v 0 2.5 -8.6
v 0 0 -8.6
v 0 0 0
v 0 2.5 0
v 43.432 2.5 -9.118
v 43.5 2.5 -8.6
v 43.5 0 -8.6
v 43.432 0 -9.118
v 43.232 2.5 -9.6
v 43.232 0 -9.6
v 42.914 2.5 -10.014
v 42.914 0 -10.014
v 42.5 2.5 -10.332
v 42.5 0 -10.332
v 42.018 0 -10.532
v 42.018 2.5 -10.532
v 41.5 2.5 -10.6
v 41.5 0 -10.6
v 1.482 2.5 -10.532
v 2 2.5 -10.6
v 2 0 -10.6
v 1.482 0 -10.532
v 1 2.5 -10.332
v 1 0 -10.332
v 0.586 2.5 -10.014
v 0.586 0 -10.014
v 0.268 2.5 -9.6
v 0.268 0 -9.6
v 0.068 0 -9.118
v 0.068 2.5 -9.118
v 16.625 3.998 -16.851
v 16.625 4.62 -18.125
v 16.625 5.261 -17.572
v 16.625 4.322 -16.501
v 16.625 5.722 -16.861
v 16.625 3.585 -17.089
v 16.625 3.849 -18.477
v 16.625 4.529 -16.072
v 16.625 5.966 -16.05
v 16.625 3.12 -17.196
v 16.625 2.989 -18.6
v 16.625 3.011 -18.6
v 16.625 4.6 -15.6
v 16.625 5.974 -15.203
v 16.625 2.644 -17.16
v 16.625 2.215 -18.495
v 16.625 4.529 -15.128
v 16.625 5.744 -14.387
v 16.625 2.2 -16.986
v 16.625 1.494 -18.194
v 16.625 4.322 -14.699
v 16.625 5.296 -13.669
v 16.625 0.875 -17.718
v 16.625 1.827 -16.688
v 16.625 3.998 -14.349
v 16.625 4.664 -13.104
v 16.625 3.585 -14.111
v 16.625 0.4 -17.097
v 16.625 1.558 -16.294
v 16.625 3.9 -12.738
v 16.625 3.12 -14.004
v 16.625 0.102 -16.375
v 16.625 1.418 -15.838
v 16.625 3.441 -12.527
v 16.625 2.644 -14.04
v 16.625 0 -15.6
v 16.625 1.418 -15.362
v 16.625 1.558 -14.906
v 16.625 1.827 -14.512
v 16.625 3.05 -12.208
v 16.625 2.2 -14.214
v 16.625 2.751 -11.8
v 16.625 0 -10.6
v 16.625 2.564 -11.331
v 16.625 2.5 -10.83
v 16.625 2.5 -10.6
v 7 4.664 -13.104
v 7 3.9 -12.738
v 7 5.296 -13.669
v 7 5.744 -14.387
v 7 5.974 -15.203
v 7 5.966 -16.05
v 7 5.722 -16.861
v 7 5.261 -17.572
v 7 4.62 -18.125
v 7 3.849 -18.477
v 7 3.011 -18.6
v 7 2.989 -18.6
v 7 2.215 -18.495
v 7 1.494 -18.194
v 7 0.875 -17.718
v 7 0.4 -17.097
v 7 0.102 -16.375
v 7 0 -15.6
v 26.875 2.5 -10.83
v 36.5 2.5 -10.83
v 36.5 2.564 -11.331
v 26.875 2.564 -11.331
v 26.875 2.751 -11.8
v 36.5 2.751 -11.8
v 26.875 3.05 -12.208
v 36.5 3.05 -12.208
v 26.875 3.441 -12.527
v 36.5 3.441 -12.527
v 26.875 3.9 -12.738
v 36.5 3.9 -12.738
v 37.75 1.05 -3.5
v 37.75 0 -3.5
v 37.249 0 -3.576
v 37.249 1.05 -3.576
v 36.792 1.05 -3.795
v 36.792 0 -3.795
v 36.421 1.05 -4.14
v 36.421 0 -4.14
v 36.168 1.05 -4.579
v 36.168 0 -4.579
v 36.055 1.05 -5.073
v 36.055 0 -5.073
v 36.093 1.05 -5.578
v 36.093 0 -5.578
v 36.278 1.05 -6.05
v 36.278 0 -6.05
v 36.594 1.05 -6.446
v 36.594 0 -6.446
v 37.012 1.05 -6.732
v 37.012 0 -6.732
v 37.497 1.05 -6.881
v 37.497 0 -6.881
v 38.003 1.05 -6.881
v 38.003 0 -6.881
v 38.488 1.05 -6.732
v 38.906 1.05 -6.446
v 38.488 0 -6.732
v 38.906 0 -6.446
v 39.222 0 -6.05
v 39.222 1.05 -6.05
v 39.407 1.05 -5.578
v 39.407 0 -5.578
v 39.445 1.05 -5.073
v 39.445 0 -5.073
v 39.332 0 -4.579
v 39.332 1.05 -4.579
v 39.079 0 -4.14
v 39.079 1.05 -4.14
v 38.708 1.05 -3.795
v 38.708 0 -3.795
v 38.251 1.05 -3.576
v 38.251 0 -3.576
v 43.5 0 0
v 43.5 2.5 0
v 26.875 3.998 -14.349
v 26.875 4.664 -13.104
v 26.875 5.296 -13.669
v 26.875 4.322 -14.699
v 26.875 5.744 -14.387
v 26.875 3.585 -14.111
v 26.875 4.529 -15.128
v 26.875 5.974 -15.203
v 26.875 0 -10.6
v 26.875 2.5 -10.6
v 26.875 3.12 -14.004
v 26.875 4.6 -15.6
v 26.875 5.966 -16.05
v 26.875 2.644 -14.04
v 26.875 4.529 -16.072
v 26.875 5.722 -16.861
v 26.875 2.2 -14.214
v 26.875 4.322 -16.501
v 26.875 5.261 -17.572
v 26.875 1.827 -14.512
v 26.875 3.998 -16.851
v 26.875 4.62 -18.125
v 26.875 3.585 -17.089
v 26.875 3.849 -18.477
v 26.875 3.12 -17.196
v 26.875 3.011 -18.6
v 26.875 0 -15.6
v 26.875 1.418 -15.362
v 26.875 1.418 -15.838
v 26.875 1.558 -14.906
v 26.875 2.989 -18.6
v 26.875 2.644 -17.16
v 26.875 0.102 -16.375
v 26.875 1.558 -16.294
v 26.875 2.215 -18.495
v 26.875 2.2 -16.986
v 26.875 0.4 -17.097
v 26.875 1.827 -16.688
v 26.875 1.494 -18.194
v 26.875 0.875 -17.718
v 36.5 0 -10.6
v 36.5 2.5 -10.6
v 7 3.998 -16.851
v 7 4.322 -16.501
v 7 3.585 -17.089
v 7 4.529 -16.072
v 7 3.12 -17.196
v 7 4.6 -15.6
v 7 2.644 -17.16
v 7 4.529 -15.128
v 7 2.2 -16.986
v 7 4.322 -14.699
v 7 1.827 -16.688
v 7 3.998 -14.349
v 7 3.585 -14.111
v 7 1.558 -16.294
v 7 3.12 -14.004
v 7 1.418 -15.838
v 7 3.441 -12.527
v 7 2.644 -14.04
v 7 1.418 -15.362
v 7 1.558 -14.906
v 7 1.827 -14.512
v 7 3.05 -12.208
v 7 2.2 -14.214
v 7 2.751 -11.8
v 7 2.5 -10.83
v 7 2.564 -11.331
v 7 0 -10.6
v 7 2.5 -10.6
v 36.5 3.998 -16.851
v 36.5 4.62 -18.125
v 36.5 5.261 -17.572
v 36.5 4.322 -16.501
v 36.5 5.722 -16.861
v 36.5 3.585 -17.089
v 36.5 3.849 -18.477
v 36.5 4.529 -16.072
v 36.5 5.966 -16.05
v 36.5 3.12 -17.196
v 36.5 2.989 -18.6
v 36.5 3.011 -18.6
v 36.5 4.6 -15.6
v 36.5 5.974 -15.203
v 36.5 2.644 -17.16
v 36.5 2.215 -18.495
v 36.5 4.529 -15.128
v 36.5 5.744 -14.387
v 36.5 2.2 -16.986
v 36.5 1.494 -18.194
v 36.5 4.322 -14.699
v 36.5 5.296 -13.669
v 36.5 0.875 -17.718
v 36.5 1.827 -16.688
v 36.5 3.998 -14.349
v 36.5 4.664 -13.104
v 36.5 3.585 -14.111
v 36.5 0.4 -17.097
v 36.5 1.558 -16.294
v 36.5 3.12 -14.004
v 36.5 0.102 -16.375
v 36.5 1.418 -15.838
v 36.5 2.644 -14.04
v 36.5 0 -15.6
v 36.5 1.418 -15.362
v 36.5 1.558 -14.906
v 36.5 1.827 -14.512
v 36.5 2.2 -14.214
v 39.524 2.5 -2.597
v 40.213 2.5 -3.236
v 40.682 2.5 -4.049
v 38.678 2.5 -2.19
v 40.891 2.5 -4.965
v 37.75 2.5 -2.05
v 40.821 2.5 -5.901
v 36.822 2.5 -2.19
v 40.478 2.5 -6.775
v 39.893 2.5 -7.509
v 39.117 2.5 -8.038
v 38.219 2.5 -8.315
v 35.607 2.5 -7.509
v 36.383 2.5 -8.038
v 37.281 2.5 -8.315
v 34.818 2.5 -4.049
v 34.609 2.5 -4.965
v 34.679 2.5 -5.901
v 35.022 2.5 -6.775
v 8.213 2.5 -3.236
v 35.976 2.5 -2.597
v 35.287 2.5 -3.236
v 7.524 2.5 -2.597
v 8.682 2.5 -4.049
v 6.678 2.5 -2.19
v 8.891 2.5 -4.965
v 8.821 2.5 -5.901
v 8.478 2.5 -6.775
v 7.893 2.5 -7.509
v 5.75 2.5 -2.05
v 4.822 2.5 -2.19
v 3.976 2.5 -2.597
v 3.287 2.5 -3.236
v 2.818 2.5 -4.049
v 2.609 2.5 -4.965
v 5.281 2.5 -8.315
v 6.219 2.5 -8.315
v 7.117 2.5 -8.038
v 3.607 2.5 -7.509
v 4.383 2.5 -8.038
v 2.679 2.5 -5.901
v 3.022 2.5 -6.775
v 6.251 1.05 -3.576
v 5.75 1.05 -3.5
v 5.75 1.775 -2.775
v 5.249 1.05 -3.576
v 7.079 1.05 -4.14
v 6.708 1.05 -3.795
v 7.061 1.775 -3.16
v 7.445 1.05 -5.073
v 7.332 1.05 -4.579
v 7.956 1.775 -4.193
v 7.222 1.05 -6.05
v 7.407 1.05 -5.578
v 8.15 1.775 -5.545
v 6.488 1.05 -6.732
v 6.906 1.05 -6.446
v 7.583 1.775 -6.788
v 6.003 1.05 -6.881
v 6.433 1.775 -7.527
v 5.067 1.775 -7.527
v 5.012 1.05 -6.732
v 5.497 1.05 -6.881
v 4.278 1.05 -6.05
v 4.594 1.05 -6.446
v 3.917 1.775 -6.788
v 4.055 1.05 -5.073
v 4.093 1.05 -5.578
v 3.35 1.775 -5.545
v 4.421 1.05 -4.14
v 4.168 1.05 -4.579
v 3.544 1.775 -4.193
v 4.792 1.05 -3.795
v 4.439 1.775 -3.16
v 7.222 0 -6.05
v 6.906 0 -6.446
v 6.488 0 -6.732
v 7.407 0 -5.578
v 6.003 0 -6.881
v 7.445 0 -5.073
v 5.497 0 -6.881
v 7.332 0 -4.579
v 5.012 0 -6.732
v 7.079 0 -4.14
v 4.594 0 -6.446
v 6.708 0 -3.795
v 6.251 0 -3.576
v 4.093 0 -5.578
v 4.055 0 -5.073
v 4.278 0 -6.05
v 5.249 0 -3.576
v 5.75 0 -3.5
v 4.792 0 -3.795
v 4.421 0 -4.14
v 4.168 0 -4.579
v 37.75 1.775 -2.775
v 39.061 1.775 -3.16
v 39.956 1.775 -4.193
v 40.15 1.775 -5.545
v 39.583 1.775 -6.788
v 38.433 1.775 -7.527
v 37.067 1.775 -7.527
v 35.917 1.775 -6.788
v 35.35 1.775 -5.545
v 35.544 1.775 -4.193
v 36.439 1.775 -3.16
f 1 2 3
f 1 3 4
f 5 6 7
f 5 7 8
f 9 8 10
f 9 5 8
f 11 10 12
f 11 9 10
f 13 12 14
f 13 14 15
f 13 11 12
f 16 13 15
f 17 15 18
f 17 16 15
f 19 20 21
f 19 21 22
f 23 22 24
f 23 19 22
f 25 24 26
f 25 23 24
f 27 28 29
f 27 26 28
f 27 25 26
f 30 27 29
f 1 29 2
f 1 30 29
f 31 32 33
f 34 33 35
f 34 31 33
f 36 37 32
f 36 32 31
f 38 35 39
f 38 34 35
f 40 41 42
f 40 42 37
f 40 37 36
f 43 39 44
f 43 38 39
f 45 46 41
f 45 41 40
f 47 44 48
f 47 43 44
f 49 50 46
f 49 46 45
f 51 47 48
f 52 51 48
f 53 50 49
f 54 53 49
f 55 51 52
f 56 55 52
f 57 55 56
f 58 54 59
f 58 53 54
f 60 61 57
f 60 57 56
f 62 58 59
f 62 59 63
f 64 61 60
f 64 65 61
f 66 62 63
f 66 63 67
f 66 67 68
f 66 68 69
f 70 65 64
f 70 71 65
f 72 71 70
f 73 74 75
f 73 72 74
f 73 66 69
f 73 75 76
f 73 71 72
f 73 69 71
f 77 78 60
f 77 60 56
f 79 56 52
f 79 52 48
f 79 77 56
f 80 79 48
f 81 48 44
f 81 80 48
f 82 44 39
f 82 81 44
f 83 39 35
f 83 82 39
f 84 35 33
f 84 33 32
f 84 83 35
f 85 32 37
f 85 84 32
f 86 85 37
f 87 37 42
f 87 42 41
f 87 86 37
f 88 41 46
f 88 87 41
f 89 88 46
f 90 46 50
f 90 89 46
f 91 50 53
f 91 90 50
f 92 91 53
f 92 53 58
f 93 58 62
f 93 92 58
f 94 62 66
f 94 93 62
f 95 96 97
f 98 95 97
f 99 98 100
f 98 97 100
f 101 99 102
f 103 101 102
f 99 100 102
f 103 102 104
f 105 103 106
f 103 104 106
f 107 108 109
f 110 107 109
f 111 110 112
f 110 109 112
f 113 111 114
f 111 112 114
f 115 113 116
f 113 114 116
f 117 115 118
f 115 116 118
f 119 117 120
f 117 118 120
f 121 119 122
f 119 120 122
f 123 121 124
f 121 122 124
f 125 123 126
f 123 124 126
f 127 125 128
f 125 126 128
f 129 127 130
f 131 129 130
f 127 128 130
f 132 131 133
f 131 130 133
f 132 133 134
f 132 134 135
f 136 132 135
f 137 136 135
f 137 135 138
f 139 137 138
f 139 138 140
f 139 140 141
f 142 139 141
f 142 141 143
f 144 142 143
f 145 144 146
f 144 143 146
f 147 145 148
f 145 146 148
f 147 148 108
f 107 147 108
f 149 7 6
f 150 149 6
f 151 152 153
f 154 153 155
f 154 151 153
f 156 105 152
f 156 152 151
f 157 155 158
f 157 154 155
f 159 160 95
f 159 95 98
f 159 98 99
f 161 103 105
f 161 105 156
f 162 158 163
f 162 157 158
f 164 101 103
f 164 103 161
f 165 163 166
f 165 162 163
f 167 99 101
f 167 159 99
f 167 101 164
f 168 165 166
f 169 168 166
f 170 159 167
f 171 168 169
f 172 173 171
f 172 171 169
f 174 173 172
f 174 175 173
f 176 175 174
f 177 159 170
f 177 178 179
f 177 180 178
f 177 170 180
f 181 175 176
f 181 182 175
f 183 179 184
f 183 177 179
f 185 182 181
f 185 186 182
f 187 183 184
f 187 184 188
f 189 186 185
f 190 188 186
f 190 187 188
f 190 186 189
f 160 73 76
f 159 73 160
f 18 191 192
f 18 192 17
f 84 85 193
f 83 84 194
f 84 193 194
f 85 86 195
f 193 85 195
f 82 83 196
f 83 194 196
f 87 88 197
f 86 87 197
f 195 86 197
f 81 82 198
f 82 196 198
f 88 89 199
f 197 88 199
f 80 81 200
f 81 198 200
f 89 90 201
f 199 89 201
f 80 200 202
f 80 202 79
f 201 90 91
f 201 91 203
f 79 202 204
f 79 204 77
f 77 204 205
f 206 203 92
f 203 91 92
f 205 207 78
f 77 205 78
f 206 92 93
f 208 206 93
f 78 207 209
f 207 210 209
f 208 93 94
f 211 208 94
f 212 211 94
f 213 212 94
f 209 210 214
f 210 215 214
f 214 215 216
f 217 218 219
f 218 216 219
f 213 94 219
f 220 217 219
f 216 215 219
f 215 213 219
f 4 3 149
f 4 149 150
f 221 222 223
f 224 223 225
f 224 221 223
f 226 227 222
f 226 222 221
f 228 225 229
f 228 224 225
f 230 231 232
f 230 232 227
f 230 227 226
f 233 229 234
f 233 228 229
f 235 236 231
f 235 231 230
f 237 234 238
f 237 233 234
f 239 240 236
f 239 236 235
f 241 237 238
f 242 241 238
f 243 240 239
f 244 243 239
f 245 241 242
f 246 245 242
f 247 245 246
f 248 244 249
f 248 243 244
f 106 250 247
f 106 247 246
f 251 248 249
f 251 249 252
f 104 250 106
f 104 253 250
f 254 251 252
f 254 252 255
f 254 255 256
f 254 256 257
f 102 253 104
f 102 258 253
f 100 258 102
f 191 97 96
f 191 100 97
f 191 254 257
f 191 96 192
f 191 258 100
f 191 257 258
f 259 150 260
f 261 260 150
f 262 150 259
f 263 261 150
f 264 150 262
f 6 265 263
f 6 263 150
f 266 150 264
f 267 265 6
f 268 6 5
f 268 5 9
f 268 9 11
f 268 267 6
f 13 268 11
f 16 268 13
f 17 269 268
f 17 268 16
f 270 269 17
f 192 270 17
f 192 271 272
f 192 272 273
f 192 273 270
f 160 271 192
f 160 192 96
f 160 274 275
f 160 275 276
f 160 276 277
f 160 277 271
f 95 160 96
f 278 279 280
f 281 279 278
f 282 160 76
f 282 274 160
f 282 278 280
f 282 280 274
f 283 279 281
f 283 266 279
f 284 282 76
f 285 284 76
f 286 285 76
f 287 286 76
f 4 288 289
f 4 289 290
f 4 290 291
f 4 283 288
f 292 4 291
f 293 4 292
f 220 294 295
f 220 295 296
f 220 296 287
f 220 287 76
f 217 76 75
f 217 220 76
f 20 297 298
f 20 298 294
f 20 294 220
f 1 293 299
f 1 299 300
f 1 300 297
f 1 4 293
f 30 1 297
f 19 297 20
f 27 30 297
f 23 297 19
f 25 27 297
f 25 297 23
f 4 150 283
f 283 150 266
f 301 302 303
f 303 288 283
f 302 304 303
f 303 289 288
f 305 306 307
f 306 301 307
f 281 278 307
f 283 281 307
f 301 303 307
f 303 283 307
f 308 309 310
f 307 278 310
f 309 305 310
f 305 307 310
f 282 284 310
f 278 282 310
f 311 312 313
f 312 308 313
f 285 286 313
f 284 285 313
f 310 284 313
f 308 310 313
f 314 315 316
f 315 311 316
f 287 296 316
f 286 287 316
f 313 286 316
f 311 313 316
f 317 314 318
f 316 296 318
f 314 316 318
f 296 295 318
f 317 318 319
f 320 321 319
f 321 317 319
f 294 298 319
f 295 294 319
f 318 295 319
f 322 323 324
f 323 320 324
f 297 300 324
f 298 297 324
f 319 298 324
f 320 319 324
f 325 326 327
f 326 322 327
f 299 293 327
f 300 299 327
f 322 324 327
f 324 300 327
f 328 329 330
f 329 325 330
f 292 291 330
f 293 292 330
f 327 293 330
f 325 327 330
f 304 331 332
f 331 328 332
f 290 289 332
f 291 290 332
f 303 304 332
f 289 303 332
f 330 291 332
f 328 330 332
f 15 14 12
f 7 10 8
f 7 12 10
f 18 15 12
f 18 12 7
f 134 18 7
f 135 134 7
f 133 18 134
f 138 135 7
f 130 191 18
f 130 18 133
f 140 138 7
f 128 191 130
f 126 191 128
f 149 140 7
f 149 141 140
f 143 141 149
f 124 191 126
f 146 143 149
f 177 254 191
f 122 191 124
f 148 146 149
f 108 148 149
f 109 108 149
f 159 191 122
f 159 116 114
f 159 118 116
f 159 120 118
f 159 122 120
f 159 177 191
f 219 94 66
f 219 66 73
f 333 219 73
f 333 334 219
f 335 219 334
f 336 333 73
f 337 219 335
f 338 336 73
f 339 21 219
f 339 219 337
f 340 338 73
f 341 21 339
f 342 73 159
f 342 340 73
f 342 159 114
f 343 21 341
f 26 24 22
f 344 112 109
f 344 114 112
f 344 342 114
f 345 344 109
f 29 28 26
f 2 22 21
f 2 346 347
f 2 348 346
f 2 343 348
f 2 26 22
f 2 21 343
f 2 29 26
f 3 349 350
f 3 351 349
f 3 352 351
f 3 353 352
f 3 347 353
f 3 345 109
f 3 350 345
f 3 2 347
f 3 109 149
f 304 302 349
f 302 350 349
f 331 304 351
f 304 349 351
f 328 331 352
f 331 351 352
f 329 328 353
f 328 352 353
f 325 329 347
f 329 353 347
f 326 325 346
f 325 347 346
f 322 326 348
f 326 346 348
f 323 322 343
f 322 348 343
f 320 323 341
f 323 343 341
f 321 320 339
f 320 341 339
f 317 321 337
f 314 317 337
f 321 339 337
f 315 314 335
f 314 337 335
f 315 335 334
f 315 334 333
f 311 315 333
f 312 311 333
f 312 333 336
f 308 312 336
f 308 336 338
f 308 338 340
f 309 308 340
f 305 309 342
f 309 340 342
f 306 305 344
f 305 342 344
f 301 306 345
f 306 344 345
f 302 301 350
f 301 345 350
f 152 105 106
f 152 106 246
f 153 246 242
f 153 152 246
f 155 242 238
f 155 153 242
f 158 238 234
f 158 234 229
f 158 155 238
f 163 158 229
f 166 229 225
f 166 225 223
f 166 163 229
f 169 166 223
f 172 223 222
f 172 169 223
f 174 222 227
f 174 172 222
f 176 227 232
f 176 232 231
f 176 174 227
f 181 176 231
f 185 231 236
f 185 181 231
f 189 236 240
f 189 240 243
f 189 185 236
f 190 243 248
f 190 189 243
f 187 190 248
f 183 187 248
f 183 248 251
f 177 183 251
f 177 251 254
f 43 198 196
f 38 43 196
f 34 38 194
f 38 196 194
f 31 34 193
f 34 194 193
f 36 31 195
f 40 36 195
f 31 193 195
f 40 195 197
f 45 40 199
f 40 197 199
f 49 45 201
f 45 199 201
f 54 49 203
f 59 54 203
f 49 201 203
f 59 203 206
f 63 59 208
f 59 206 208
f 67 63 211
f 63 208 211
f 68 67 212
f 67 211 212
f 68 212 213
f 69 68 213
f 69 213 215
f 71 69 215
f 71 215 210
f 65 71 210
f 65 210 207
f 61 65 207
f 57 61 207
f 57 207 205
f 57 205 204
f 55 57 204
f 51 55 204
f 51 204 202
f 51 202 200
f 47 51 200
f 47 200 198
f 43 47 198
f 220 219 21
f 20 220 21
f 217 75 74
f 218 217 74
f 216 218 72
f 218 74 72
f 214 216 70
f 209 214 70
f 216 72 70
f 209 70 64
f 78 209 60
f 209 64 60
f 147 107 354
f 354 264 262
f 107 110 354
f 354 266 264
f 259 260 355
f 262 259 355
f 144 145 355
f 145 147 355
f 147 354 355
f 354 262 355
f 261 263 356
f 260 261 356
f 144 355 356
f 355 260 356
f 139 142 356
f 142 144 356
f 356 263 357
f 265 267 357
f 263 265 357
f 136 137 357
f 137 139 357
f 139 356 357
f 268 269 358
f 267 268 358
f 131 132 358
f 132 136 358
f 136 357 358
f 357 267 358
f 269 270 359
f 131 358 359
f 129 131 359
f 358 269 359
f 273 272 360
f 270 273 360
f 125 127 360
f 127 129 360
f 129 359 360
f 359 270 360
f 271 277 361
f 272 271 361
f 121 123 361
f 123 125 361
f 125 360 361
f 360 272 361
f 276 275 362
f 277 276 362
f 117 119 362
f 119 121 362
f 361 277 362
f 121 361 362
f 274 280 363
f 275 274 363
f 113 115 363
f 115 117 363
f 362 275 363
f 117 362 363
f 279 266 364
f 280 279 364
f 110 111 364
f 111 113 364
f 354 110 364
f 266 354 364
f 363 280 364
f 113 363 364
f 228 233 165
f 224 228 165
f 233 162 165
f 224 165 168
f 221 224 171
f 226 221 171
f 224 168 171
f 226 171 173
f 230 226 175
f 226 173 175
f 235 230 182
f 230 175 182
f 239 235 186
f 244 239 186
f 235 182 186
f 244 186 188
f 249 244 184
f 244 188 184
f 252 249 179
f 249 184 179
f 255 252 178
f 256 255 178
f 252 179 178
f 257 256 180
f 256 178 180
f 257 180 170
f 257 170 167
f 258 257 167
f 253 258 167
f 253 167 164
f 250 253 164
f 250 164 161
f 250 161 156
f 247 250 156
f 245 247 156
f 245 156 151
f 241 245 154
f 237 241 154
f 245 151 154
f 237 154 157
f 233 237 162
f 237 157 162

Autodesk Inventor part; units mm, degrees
ref_plane "YZ Plane" through (0, 0, 0) normal (1, 0, 0) x (0, 1, 0)
ref_plane "XZ Plane" through (0, 0, 0) normal (0, 1, 0) x (-1, 0, 0)
ref_plane "XY Plane" through (0, 0, 0) normal (0, 0, 1) x (1, 0, 0)
sketch "Sketch1" plane through (0, 0, 0) normal (1, 0, 0) x (0, 1, 0)
  line L0 (0, 0) -> (2.5, 0)
  line L1 (2.5, 0) -> (2.5, -12.642)
  line L2 (0, -15.6) -> (0, 0)
  arc A0 (0, -15.6) -> (2.5, -12.642) centre (3, -15.6) ccw
  circle A1 centre (3, -15.6) radius 1.6
  point P0 (2.5, -5.2)
  dimension "d0" = 3
  dimension "d1" = 3.2
  dimension "d2" = 2.5
  dimension "d3" = 5.2
  dimension "d4" = 10.4
  dimension "d5" = 3
extrude "Extrusion1" add sketch "Sketch1" along normal blind 43.5
sketch "Sketch2" plane through (0, 0, -15.6) normal (0, -1, 0) x (1, 0, 0)
  line L0 (0, -3) -> (43.5, -3) projected
  line L1 (26.875, -3) -> (16.625, -3)
  line L2 (16.625, -3) -> (16.625, 5)
  line L3 (16.625, 5) -> (26.875, 5)
  line L4 (26.875, 5) -> (26.875, -3)
  line L5 (43.5, -3) -> (43.5, 3) projected
  line L6 (43.5, -3) -> (36.5, -3)
  line L7 (36.5, -3) -> (36.5, 5)
  line L8 (36.5, 5) -> (43.5, 5)
  line L9 (43.5, 5) -> (43.5, -3)
  line L10 (0, -3) -> (7, -3)
  line L11 (7, -3) -> (7, 5)
  line L12 (7, 5) -> (0, 5)
  line L13 (0, 5) -> (0, -3)
  line L14 (43.5, 15.6) -> (43.5, 0) projected
  point P0 (0, 15.6)
  point P1 (43.5, 2.958)
  dimension "d8" = 10.25
  dimension "d9" = 43.5
  dimension "d10" = 16.625
  dimension "d11" = 8
  dimension "d12" = 7
  dimension "d13" = 7
extrude "Extrusion2" cut sketch "Sketch2" against normal through all
sketch "Sketch3" plane through (0, 2.5, 0) normal (0, 1, 0) x (1, 0, 0)
  line L0 (0, 5.2) -> (43.5, 5.2) construction
  line L1 (43.5, 10.6) -> (43.5, 0) construction
  point P0 (0, 0)
  point P1 (5.75, 5.2)
  point P2 (37.75, 5.2)
  dimension "d16" = 32
  dimension "d17" = 43.5
  dimension "d18" = 5.75
hole "Hole1" at (5.75, 2.5, -5.2) at (37.75, 2.5, -5.2) direction (0, -1, 0) diameter 3.4 depth 2.5 countersink diameter 6.3 countersink angle 90 clearance for "Flat Head Machine Screw" size "M3" standard "Ansi Metric M Profile"
fillet "Fillet1" radius 2 4 edges at (0, 1.25, -10.6) (43.5, 1.25, -10.6) (11.8125, 2.5, -12.642) (31.6875, 2.5, -12.642)
equation "\"d5\" = d0"
equation "\"d10\" = -0.5 * d8 + 0.5 * d9"
equation "\"d13\" = d12"
equation "\"d18\" = -0.5 * d16 + 0.5 * d17"
properties part number "hinge_v1"
